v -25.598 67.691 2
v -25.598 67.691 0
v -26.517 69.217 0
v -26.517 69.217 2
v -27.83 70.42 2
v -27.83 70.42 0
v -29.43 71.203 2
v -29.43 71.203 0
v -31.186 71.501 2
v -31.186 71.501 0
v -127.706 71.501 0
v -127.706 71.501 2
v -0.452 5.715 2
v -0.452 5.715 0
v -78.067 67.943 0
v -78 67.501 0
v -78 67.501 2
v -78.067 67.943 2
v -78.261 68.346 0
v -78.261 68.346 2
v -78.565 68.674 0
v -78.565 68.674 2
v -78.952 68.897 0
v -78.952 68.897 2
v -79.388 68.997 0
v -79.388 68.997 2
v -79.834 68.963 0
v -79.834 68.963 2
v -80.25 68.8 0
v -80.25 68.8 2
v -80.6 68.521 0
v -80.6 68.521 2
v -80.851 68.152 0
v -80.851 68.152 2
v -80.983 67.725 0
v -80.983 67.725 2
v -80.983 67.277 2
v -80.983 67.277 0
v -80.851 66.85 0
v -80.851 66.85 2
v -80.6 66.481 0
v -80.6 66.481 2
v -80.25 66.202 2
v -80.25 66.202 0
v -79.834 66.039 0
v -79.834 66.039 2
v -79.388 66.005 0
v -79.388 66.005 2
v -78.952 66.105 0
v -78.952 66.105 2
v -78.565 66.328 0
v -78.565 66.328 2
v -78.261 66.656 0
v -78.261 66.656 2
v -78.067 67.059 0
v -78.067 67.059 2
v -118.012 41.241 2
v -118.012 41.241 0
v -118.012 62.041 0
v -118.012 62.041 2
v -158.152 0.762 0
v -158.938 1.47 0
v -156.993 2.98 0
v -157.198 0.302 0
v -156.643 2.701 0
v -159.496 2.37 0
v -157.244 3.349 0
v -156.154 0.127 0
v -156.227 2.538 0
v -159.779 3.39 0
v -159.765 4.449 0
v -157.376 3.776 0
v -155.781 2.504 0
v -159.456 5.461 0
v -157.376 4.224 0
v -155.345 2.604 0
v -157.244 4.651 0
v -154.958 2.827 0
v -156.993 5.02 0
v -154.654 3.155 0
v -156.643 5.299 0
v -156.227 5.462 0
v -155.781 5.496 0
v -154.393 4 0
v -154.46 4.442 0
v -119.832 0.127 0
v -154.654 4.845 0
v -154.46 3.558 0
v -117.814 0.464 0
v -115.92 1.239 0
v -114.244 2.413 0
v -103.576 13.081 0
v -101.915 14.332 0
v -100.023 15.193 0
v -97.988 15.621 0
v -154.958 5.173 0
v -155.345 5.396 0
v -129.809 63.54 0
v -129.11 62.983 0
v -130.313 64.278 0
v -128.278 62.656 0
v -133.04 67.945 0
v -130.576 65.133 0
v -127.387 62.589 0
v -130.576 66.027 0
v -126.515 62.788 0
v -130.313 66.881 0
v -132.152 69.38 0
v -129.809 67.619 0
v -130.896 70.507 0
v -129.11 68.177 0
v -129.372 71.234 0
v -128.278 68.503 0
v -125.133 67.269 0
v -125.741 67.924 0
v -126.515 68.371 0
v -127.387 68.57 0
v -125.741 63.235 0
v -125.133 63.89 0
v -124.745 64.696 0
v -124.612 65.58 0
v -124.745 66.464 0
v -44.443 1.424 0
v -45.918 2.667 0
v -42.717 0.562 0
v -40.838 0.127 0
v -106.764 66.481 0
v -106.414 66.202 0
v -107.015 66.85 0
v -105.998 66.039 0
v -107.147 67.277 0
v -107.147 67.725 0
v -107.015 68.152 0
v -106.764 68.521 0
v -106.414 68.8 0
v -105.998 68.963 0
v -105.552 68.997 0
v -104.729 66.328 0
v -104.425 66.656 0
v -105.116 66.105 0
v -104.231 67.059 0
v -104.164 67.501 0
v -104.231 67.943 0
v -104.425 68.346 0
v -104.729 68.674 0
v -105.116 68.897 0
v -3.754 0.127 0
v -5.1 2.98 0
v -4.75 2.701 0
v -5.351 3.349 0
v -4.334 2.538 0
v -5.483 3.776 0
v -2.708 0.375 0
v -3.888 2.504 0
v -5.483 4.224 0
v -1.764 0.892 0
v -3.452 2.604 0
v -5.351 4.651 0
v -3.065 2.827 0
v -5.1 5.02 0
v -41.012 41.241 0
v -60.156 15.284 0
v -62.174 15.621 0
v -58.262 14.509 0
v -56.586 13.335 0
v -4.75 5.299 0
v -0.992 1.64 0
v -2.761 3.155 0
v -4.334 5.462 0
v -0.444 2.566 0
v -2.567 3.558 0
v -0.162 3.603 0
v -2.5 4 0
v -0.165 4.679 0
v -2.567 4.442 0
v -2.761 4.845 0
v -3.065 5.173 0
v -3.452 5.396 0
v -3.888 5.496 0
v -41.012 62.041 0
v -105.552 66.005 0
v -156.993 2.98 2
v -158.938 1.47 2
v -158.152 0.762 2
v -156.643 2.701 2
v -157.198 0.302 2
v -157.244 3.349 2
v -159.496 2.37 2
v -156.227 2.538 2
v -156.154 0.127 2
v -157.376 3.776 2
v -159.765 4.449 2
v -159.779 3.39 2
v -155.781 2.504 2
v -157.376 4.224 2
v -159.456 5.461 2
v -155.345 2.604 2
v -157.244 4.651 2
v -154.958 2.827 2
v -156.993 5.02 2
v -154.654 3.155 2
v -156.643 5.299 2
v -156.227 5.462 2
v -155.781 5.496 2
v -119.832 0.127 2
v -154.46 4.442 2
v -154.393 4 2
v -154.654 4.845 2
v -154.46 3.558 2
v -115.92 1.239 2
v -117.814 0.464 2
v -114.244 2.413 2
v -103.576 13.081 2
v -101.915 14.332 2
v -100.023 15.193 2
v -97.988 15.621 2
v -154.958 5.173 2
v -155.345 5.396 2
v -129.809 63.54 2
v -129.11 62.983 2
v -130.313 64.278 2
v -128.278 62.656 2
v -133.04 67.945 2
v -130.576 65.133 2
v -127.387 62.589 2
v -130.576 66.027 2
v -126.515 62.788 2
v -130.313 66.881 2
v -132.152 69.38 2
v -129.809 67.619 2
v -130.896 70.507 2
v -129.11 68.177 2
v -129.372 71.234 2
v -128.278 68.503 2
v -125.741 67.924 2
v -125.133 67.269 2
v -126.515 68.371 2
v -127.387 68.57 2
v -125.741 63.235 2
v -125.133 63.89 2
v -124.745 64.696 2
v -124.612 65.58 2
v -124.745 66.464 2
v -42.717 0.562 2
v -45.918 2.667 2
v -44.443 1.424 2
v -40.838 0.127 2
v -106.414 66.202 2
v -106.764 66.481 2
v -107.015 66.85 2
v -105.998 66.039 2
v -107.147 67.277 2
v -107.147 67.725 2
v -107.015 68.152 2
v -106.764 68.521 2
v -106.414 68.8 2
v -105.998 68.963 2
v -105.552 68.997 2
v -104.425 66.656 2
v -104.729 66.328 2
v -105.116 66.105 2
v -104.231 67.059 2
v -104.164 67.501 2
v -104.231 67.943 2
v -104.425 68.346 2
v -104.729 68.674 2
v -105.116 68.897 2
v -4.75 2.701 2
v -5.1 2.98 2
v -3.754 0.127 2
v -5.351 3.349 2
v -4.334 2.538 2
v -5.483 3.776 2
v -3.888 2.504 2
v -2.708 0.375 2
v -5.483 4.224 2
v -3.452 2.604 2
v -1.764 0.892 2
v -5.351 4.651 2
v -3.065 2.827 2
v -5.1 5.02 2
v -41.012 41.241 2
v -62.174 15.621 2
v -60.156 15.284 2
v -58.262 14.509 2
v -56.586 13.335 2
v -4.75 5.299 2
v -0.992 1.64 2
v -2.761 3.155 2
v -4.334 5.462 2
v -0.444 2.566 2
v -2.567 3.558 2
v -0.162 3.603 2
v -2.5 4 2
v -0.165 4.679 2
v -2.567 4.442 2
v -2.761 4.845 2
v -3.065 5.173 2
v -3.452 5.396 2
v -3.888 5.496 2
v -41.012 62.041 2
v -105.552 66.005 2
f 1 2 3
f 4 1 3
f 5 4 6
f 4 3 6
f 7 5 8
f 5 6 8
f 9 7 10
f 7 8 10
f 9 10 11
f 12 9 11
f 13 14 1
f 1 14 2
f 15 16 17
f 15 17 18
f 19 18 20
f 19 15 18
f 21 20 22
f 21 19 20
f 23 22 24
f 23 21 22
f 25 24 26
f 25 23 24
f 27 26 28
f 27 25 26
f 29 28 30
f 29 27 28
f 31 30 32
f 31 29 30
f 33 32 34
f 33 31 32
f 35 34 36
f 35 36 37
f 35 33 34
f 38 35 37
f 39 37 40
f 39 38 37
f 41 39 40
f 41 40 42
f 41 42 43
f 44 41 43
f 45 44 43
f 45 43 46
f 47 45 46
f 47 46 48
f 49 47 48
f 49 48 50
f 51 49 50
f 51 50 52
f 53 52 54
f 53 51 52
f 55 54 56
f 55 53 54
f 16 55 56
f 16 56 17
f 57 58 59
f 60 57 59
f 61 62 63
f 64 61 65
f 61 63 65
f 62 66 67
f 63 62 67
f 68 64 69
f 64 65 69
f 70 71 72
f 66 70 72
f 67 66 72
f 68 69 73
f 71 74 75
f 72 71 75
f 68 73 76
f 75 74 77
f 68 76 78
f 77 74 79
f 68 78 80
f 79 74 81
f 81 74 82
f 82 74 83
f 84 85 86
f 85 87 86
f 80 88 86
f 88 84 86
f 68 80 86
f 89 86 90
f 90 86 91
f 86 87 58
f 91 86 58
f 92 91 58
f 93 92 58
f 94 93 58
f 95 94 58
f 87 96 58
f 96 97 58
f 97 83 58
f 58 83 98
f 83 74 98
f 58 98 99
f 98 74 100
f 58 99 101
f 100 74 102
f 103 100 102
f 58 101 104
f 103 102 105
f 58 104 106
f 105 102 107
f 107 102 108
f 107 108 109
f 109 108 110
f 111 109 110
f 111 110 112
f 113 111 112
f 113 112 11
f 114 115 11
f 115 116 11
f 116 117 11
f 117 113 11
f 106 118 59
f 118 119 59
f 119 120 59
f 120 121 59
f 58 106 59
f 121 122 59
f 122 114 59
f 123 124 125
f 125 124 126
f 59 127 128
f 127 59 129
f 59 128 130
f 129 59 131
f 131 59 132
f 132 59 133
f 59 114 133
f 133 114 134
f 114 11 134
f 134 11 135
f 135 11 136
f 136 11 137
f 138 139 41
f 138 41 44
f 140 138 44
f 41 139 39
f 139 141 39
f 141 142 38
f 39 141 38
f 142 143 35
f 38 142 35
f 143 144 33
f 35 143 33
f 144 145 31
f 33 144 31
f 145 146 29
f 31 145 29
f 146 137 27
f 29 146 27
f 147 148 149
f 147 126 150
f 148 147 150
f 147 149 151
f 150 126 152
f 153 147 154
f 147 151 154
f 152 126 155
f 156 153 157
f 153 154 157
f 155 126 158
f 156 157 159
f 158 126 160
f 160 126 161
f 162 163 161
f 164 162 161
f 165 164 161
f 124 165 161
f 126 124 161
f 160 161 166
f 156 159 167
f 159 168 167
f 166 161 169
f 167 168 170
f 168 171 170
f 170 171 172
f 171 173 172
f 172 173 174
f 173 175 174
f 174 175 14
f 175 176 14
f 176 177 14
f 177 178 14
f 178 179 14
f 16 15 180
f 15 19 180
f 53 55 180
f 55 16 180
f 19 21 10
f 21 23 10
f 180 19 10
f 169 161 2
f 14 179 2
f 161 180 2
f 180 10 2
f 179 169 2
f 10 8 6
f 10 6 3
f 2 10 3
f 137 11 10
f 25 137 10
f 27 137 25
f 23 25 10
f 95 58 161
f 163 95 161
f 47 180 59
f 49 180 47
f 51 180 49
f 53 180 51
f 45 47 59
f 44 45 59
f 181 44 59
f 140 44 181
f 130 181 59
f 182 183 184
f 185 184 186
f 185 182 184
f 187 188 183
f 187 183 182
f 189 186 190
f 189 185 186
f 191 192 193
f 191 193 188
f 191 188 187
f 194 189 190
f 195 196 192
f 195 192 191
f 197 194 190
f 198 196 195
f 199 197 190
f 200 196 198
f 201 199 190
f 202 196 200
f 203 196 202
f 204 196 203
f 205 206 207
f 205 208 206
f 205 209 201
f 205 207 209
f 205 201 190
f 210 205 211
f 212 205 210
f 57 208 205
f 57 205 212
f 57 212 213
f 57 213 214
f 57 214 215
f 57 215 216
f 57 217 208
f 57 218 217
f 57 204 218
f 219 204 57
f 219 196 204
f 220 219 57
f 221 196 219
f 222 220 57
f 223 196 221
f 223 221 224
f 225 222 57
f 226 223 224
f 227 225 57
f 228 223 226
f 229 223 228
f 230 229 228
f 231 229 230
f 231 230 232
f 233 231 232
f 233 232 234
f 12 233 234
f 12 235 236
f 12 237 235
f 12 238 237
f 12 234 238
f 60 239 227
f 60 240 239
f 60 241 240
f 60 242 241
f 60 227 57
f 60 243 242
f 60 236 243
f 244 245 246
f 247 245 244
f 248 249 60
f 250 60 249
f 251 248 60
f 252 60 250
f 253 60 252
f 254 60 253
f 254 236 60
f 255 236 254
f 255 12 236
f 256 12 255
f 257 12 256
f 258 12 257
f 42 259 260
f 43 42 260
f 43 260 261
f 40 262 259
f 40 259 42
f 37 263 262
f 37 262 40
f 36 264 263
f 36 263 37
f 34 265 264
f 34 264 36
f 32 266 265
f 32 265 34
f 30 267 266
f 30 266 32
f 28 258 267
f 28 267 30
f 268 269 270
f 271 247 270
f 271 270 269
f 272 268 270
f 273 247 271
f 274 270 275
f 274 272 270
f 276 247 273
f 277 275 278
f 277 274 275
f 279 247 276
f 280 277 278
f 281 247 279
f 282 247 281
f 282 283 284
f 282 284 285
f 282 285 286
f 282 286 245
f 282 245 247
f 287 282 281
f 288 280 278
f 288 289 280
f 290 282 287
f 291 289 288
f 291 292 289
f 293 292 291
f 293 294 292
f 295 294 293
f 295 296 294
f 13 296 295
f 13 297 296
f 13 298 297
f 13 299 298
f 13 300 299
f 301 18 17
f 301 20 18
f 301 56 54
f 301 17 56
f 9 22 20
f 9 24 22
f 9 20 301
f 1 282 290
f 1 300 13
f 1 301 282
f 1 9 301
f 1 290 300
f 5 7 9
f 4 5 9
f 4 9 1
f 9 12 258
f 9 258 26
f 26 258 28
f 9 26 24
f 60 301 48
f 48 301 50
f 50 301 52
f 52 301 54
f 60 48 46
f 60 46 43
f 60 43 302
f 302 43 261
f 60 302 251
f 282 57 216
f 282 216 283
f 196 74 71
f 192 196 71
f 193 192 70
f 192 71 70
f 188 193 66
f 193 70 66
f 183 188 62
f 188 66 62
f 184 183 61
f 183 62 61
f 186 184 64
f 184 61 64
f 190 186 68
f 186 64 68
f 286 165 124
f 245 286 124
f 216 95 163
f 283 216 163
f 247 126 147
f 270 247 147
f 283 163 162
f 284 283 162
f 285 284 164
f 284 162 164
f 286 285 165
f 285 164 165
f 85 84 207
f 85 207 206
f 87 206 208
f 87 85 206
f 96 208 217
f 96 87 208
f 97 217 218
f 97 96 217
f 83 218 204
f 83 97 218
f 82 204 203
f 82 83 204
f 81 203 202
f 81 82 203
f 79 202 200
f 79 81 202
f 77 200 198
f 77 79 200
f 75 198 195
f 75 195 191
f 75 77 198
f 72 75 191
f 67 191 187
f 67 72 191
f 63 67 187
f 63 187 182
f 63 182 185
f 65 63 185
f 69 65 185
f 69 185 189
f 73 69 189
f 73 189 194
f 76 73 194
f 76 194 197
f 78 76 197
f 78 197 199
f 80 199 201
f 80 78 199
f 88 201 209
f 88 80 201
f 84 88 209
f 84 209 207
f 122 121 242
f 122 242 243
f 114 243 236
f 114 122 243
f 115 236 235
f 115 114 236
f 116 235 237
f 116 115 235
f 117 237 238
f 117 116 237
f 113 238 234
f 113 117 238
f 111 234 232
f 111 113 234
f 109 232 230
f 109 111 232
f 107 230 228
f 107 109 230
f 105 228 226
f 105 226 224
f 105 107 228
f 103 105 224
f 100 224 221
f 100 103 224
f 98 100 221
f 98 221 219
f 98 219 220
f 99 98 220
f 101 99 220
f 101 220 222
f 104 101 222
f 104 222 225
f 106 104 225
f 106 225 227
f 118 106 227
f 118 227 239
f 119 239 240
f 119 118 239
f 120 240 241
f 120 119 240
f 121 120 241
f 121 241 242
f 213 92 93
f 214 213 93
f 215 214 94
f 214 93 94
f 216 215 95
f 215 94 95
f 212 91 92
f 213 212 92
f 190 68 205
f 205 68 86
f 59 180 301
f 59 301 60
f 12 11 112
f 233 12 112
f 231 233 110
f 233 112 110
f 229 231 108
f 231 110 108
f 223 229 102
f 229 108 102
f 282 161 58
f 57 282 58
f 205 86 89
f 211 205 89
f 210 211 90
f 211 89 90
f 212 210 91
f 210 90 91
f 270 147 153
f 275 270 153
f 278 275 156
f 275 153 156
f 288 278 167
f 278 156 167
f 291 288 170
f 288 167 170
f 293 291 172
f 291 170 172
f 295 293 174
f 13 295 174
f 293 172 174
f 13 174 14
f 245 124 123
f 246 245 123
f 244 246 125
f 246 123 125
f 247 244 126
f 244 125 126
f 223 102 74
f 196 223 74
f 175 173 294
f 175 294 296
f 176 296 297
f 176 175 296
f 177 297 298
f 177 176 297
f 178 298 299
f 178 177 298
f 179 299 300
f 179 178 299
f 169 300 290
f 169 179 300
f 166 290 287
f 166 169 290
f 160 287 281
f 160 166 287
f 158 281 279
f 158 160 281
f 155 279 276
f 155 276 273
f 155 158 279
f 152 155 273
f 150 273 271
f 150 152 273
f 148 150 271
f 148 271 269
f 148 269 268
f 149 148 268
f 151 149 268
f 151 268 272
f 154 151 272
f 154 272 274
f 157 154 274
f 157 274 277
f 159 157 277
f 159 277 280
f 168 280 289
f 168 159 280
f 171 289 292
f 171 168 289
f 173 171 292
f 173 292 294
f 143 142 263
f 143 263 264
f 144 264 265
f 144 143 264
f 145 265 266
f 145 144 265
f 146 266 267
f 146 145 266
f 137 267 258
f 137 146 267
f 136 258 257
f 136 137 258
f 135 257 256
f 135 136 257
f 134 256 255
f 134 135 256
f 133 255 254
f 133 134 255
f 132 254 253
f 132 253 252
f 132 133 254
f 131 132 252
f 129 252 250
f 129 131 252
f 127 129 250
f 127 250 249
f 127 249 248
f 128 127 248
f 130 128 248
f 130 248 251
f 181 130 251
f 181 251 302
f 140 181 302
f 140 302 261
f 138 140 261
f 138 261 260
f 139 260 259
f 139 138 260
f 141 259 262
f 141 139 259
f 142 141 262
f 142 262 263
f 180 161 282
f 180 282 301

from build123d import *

# Parameters (mm, degrees)
ESBO_O1_R                = 2.998945894
ESBO_O1_R_2              = 1.5
RESSALTO_EXTRUS_O1_DEPTH = 2
ESBO_O3_W                = 77.000000909
ESBO_O3_H                = 20.799996635
CORTE_EXTRUS_O2_DEPTH    = 3


with BuildPart() as part:
    # Esboço1 → Ressalto-extrusão1 (new body)
    with BuildSketch(Plane.XY):
        with BuildLine():
            Line((-0.452, 5.715), (-25.598, 67.691))
            ThreePointArc((-25.598, 67.691), (-27.830124117, 70.420084628), (-31.186, 71.501))
            Line((-31.186, 71.501), (-127.706, 71.501))
            ThreePointArc((-127.706, 71.501), (-130.895769937, 70.507154905), (-133.04, 67.945))
            Line((-133.04, 67.945), (-159.456, 5.461))
            ThreePointArc((-159.456, 5.461), (-159.249042624, 1.900068852), (-156.154, 0.127))
            Line((-156.154, 0.127), (-119.832, 0.127))
            ThreePointArc((-119.832, 0.127), (-116.845272565, 0.798888491), (-114.244, 2.413))
            Line((-114.244, 2.413), (-103.576, 13.081))
            ThreePointArc((-103.576, 13.081), (-100.992547951, 14.814205491), (-97.988, 15.621))
            Line((-97.988, 15.621), (-62.174, 15.621))
            ThreePointArc((-62.174, 15.621), (-59.187272565, 14.949111509), (-56.586, 13.335))
            Line((-56.586, 13.335), (-45.918, 2.667))
            ThreePointArc((-45.918, 2.667), (-43.605600005, 0.941799989), (-40.838, 0.127))
            Line((-40.838, 0.127), (-3.754, 0.127))
            ThreePointArc((-3.754, 0.127), (-0.686880545, 2.08420214), (-0.452, 5.715))
        make_face()
        with Locations((-127.610794879, 65.579692319)):
            Circle(ESBO_O1_R, mode=Mode.SUBTRACT)
        with Locations((-105.664, 67.501)):
            Circle(ESBO_O1_R_2, mode=Mode.SUBTRACT)
        with Locations((-79.5, 67.501)):
            Circle(ESBO_O1_R_2, mode=Mode.SUBTRACT)
        with Locations((-4, 4)):
            Circle(ESBO_O1_R_2, mode=Mode.SUBTRACT)
        with Locations((-155.893, 4)):
            Circle(ESBO_O1_R_2, mode=Mode.SUBTRACT)
    extrude(amount=RESSALTO_EXTRUS_O1_DEPTH)

    # Esboço3 → Corte-extrusão2 (cut, through all)
    with BuildSketch(Plane(origin=(0, 0, 0), x_dir=(-1, 0, 0), z_dir=(0, 0, -1))):
        with Locations((79.512001037, 51.64081955)):
            Rectangle(ESBO_O3_W, ESBO_O3_H)
    extrude(amount=-CORTE_EXTRUS_O2_DEPTH, mode=Mode.SUBTRACT)


solid = part.part
